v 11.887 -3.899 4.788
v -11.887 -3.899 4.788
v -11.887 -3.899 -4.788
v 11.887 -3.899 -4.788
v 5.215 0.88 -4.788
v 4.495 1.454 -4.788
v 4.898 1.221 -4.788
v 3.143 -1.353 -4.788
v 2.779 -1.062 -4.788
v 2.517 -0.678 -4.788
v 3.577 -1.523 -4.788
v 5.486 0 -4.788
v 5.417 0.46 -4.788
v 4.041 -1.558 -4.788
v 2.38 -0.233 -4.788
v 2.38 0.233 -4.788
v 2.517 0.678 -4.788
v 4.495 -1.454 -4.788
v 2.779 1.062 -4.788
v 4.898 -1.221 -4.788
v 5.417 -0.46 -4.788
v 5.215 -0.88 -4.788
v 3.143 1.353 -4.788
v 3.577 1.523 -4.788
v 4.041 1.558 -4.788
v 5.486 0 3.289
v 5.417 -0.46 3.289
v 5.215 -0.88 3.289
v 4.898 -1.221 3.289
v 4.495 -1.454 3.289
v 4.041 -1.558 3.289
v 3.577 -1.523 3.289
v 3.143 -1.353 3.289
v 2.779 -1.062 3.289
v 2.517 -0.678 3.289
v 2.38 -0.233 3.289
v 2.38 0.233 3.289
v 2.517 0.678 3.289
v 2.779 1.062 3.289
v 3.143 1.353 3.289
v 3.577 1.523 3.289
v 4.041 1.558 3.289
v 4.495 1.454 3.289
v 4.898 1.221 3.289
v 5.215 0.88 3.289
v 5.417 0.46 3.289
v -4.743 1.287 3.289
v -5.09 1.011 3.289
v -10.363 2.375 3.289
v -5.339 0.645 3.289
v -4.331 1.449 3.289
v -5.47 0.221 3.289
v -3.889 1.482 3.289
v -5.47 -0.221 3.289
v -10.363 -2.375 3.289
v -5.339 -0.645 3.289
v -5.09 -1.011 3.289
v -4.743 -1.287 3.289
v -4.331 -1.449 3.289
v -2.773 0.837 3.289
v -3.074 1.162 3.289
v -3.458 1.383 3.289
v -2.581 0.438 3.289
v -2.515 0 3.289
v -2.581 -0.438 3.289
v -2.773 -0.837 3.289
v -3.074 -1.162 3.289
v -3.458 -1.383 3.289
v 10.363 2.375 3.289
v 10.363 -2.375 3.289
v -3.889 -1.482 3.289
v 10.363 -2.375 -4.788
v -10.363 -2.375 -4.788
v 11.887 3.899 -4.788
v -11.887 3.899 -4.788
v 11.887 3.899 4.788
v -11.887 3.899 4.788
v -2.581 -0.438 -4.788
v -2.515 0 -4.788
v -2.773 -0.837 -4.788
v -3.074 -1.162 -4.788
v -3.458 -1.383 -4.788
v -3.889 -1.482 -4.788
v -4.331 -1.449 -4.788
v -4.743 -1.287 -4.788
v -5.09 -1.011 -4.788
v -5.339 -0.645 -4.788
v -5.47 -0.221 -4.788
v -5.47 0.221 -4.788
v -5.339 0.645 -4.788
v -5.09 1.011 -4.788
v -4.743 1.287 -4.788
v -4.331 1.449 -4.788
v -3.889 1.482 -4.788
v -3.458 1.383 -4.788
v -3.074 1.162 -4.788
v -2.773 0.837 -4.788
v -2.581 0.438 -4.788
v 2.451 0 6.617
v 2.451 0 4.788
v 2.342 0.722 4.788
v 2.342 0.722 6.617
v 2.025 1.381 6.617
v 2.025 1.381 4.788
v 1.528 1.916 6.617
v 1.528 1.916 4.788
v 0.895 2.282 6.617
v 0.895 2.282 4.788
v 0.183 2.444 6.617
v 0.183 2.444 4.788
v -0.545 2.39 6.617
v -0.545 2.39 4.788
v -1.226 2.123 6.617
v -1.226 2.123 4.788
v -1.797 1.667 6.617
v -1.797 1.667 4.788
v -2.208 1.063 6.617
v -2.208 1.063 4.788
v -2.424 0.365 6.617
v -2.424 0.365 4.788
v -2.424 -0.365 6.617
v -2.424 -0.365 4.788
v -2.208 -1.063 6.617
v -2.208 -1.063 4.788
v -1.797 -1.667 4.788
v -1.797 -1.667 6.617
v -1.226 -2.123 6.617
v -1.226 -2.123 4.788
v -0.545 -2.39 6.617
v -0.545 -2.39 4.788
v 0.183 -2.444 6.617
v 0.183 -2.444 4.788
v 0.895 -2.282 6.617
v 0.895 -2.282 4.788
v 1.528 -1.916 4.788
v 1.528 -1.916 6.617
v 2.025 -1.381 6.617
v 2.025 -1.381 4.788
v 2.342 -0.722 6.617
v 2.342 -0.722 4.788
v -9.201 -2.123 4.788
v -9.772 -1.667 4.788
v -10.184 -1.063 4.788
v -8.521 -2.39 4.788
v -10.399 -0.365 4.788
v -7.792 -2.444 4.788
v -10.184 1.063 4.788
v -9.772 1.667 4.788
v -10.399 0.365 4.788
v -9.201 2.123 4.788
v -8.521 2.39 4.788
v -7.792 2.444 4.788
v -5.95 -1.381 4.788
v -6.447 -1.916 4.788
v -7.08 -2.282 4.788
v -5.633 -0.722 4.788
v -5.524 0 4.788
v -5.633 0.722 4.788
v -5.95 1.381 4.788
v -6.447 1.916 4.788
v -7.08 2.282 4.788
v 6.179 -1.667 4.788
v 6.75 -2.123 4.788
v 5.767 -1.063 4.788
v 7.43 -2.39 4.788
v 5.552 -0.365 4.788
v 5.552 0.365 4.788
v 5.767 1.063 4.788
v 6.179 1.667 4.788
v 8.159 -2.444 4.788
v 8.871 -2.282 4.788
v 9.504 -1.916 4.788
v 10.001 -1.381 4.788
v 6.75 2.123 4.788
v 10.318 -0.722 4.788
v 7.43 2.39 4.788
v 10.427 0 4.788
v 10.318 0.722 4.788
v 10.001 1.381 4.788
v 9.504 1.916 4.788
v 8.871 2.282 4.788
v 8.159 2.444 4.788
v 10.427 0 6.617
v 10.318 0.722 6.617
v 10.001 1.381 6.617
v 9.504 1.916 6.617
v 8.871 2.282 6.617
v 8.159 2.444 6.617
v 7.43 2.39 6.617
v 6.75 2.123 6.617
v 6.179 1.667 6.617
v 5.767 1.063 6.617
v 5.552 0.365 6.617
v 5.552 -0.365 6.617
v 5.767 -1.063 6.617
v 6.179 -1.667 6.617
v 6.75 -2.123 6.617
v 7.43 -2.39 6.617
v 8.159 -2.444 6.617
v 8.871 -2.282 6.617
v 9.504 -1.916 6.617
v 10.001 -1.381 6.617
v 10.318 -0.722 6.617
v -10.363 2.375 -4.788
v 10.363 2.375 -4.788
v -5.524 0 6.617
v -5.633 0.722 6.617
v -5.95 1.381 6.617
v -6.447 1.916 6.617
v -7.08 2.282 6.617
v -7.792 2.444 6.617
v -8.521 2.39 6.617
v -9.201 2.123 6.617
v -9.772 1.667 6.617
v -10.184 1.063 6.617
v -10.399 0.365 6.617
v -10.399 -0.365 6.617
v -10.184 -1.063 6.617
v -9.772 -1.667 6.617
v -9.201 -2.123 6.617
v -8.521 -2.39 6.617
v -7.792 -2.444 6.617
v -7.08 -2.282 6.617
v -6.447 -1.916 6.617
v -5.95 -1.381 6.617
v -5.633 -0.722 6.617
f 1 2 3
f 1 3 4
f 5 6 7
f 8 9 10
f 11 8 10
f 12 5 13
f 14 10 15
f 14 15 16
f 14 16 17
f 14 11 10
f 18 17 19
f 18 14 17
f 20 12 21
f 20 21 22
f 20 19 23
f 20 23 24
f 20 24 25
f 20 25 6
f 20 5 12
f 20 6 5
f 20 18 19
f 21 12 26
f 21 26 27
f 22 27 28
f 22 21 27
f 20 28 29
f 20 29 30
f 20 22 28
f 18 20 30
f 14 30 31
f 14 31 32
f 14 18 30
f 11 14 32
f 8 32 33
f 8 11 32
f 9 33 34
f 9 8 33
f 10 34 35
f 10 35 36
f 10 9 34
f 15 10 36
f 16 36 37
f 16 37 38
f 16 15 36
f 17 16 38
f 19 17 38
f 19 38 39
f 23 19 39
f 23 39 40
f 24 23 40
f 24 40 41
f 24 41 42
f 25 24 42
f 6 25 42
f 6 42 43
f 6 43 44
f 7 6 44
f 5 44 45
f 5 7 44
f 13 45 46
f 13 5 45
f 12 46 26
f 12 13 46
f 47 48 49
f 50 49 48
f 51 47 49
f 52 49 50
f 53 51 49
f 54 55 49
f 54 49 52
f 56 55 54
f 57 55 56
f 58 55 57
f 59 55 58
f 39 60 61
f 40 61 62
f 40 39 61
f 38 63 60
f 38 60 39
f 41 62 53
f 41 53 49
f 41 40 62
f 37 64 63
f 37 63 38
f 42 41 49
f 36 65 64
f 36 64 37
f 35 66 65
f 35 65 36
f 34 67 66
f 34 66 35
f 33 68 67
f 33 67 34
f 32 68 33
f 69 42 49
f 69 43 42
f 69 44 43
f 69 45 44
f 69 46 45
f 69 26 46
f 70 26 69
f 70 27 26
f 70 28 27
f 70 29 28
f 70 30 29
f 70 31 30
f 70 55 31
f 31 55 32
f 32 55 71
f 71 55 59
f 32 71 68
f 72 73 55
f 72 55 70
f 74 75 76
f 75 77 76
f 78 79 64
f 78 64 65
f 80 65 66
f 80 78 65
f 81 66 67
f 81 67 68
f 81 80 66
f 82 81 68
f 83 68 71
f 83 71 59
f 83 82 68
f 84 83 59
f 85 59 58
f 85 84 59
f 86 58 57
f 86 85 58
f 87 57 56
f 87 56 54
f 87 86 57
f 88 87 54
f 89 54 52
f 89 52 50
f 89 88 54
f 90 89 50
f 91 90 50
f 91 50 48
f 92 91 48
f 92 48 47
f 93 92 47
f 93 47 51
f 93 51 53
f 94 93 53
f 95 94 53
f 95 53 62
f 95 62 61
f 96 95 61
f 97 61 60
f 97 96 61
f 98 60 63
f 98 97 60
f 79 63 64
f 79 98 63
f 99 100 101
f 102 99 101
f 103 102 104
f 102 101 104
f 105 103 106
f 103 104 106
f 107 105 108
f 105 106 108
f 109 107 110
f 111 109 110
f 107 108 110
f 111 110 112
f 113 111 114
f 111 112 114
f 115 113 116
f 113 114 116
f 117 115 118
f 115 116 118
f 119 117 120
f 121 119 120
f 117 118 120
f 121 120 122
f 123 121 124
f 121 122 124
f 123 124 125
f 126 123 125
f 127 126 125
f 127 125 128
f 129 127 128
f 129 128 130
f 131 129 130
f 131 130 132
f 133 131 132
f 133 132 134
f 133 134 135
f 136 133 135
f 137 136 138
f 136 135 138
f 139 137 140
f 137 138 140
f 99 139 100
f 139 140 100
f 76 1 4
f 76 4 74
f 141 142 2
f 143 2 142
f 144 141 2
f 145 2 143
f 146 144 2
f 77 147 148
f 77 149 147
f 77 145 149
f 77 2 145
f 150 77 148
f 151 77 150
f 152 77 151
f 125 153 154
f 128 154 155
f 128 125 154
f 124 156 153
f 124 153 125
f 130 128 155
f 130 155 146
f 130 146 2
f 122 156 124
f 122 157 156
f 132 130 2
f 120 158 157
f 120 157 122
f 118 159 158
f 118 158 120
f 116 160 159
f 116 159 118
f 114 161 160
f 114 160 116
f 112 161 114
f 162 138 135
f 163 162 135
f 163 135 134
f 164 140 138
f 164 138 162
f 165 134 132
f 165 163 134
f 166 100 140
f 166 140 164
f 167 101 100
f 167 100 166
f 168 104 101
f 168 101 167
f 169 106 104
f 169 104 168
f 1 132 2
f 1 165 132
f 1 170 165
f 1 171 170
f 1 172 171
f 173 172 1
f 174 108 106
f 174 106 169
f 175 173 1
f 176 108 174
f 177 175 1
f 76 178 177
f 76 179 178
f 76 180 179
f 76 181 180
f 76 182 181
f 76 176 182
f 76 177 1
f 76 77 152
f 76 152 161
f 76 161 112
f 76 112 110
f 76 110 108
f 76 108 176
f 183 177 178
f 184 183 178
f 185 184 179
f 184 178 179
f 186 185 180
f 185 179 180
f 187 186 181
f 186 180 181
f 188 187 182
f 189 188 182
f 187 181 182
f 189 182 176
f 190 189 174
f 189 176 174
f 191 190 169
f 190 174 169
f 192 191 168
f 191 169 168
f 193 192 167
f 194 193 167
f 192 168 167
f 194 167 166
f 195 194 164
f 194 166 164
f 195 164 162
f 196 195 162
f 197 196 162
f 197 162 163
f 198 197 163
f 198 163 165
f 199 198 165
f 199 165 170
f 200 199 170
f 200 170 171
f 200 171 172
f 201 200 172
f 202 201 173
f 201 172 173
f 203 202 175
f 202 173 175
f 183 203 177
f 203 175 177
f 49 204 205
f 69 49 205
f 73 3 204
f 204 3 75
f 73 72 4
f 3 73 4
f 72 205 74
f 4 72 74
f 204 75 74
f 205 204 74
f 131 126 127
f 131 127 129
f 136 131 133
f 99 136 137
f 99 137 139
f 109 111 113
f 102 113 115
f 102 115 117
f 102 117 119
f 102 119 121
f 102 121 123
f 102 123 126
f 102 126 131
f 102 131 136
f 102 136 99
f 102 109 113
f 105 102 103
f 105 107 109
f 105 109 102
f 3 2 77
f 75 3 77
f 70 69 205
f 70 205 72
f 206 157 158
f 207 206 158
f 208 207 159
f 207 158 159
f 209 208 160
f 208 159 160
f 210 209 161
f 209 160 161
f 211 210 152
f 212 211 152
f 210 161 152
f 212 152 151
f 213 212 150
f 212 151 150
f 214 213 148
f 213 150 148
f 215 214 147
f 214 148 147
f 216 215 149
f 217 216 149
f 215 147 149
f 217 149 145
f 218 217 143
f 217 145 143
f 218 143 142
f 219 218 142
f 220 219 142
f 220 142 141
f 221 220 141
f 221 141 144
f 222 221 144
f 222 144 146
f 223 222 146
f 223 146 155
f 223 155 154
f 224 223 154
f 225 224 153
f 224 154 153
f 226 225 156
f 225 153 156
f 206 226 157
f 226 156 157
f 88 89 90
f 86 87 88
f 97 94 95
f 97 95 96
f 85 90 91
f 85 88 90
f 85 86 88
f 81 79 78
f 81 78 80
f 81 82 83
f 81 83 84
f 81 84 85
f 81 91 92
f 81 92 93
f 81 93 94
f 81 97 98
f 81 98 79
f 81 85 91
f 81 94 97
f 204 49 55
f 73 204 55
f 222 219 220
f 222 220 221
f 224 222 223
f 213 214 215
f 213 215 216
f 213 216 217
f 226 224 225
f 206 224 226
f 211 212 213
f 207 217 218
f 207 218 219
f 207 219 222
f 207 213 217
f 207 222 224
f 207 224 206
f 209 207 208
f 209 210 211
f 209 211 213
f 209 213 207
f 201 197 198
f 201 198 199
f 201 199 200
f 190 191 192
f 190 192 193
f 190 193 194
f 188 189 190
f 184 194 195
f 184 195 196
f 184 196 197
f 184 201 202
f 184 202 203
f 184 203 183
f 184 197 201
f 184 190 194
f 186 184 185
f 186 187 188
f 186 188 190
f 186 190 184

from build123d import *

# Parameters (mm, degrees)
F0_W     = 23.7744
F0_H     = 7.7978
F1_DEPTH = 4.7879
F2_R     = 2.4511
F3_DEPTH = 1.8288
F4_W     = 20.7264
F4_H     = 4.7498
F6_DEPTH = 8.0772
F5_R     = 1.4859
F5_R_2   = 1.5621
F7_DEPTH = 8.0772


with BuildPart() as f1:
    # F0 (on Top) → F1 (new body, symmetric)
    with BuildSketch(Plane.XY):
        Rectangle(F0_W, F0_H)
    extrude(amount=F1_DEPTH, both=True)

    # F2 (on face) → F3 (join)
    with BuildSketch(Plane.XY.offset(4.7879)):
        with Locations((-7.9756, 0)):
            Circle(F2_R)
        Circle(F2_R)
        with Locations((7.9756, 0)):
            Circle(F2_R)
    extrude(amount=F3_DEPTH)

    # F4 (on face) → F6 (cut)
    with BuildSketch(Plane(origin=(0, 0, -4.7879), x_dir=(1, 0, 0), z_dir=(0, 0, -1))):
        Rectangle(F4_W, F4_H)
    extrude(amount=-F6_DEPTH, mode=Mode.SUBTRACT)

    # F5 (on face) → F7 (join)
    with BuildSketch(Plane(origin=(0, 0, -4.7879), x_dir=(1, 0, 0), z_dir=(0, 0, -1))):
        with Locations((-4.0005, 0)):
            Circle(F5_R)
        with Locations((3.9243, 0)):
            Circle(F5_R_2)
    extrude(amount=-F7_DEPTH)


solid = f1.part
